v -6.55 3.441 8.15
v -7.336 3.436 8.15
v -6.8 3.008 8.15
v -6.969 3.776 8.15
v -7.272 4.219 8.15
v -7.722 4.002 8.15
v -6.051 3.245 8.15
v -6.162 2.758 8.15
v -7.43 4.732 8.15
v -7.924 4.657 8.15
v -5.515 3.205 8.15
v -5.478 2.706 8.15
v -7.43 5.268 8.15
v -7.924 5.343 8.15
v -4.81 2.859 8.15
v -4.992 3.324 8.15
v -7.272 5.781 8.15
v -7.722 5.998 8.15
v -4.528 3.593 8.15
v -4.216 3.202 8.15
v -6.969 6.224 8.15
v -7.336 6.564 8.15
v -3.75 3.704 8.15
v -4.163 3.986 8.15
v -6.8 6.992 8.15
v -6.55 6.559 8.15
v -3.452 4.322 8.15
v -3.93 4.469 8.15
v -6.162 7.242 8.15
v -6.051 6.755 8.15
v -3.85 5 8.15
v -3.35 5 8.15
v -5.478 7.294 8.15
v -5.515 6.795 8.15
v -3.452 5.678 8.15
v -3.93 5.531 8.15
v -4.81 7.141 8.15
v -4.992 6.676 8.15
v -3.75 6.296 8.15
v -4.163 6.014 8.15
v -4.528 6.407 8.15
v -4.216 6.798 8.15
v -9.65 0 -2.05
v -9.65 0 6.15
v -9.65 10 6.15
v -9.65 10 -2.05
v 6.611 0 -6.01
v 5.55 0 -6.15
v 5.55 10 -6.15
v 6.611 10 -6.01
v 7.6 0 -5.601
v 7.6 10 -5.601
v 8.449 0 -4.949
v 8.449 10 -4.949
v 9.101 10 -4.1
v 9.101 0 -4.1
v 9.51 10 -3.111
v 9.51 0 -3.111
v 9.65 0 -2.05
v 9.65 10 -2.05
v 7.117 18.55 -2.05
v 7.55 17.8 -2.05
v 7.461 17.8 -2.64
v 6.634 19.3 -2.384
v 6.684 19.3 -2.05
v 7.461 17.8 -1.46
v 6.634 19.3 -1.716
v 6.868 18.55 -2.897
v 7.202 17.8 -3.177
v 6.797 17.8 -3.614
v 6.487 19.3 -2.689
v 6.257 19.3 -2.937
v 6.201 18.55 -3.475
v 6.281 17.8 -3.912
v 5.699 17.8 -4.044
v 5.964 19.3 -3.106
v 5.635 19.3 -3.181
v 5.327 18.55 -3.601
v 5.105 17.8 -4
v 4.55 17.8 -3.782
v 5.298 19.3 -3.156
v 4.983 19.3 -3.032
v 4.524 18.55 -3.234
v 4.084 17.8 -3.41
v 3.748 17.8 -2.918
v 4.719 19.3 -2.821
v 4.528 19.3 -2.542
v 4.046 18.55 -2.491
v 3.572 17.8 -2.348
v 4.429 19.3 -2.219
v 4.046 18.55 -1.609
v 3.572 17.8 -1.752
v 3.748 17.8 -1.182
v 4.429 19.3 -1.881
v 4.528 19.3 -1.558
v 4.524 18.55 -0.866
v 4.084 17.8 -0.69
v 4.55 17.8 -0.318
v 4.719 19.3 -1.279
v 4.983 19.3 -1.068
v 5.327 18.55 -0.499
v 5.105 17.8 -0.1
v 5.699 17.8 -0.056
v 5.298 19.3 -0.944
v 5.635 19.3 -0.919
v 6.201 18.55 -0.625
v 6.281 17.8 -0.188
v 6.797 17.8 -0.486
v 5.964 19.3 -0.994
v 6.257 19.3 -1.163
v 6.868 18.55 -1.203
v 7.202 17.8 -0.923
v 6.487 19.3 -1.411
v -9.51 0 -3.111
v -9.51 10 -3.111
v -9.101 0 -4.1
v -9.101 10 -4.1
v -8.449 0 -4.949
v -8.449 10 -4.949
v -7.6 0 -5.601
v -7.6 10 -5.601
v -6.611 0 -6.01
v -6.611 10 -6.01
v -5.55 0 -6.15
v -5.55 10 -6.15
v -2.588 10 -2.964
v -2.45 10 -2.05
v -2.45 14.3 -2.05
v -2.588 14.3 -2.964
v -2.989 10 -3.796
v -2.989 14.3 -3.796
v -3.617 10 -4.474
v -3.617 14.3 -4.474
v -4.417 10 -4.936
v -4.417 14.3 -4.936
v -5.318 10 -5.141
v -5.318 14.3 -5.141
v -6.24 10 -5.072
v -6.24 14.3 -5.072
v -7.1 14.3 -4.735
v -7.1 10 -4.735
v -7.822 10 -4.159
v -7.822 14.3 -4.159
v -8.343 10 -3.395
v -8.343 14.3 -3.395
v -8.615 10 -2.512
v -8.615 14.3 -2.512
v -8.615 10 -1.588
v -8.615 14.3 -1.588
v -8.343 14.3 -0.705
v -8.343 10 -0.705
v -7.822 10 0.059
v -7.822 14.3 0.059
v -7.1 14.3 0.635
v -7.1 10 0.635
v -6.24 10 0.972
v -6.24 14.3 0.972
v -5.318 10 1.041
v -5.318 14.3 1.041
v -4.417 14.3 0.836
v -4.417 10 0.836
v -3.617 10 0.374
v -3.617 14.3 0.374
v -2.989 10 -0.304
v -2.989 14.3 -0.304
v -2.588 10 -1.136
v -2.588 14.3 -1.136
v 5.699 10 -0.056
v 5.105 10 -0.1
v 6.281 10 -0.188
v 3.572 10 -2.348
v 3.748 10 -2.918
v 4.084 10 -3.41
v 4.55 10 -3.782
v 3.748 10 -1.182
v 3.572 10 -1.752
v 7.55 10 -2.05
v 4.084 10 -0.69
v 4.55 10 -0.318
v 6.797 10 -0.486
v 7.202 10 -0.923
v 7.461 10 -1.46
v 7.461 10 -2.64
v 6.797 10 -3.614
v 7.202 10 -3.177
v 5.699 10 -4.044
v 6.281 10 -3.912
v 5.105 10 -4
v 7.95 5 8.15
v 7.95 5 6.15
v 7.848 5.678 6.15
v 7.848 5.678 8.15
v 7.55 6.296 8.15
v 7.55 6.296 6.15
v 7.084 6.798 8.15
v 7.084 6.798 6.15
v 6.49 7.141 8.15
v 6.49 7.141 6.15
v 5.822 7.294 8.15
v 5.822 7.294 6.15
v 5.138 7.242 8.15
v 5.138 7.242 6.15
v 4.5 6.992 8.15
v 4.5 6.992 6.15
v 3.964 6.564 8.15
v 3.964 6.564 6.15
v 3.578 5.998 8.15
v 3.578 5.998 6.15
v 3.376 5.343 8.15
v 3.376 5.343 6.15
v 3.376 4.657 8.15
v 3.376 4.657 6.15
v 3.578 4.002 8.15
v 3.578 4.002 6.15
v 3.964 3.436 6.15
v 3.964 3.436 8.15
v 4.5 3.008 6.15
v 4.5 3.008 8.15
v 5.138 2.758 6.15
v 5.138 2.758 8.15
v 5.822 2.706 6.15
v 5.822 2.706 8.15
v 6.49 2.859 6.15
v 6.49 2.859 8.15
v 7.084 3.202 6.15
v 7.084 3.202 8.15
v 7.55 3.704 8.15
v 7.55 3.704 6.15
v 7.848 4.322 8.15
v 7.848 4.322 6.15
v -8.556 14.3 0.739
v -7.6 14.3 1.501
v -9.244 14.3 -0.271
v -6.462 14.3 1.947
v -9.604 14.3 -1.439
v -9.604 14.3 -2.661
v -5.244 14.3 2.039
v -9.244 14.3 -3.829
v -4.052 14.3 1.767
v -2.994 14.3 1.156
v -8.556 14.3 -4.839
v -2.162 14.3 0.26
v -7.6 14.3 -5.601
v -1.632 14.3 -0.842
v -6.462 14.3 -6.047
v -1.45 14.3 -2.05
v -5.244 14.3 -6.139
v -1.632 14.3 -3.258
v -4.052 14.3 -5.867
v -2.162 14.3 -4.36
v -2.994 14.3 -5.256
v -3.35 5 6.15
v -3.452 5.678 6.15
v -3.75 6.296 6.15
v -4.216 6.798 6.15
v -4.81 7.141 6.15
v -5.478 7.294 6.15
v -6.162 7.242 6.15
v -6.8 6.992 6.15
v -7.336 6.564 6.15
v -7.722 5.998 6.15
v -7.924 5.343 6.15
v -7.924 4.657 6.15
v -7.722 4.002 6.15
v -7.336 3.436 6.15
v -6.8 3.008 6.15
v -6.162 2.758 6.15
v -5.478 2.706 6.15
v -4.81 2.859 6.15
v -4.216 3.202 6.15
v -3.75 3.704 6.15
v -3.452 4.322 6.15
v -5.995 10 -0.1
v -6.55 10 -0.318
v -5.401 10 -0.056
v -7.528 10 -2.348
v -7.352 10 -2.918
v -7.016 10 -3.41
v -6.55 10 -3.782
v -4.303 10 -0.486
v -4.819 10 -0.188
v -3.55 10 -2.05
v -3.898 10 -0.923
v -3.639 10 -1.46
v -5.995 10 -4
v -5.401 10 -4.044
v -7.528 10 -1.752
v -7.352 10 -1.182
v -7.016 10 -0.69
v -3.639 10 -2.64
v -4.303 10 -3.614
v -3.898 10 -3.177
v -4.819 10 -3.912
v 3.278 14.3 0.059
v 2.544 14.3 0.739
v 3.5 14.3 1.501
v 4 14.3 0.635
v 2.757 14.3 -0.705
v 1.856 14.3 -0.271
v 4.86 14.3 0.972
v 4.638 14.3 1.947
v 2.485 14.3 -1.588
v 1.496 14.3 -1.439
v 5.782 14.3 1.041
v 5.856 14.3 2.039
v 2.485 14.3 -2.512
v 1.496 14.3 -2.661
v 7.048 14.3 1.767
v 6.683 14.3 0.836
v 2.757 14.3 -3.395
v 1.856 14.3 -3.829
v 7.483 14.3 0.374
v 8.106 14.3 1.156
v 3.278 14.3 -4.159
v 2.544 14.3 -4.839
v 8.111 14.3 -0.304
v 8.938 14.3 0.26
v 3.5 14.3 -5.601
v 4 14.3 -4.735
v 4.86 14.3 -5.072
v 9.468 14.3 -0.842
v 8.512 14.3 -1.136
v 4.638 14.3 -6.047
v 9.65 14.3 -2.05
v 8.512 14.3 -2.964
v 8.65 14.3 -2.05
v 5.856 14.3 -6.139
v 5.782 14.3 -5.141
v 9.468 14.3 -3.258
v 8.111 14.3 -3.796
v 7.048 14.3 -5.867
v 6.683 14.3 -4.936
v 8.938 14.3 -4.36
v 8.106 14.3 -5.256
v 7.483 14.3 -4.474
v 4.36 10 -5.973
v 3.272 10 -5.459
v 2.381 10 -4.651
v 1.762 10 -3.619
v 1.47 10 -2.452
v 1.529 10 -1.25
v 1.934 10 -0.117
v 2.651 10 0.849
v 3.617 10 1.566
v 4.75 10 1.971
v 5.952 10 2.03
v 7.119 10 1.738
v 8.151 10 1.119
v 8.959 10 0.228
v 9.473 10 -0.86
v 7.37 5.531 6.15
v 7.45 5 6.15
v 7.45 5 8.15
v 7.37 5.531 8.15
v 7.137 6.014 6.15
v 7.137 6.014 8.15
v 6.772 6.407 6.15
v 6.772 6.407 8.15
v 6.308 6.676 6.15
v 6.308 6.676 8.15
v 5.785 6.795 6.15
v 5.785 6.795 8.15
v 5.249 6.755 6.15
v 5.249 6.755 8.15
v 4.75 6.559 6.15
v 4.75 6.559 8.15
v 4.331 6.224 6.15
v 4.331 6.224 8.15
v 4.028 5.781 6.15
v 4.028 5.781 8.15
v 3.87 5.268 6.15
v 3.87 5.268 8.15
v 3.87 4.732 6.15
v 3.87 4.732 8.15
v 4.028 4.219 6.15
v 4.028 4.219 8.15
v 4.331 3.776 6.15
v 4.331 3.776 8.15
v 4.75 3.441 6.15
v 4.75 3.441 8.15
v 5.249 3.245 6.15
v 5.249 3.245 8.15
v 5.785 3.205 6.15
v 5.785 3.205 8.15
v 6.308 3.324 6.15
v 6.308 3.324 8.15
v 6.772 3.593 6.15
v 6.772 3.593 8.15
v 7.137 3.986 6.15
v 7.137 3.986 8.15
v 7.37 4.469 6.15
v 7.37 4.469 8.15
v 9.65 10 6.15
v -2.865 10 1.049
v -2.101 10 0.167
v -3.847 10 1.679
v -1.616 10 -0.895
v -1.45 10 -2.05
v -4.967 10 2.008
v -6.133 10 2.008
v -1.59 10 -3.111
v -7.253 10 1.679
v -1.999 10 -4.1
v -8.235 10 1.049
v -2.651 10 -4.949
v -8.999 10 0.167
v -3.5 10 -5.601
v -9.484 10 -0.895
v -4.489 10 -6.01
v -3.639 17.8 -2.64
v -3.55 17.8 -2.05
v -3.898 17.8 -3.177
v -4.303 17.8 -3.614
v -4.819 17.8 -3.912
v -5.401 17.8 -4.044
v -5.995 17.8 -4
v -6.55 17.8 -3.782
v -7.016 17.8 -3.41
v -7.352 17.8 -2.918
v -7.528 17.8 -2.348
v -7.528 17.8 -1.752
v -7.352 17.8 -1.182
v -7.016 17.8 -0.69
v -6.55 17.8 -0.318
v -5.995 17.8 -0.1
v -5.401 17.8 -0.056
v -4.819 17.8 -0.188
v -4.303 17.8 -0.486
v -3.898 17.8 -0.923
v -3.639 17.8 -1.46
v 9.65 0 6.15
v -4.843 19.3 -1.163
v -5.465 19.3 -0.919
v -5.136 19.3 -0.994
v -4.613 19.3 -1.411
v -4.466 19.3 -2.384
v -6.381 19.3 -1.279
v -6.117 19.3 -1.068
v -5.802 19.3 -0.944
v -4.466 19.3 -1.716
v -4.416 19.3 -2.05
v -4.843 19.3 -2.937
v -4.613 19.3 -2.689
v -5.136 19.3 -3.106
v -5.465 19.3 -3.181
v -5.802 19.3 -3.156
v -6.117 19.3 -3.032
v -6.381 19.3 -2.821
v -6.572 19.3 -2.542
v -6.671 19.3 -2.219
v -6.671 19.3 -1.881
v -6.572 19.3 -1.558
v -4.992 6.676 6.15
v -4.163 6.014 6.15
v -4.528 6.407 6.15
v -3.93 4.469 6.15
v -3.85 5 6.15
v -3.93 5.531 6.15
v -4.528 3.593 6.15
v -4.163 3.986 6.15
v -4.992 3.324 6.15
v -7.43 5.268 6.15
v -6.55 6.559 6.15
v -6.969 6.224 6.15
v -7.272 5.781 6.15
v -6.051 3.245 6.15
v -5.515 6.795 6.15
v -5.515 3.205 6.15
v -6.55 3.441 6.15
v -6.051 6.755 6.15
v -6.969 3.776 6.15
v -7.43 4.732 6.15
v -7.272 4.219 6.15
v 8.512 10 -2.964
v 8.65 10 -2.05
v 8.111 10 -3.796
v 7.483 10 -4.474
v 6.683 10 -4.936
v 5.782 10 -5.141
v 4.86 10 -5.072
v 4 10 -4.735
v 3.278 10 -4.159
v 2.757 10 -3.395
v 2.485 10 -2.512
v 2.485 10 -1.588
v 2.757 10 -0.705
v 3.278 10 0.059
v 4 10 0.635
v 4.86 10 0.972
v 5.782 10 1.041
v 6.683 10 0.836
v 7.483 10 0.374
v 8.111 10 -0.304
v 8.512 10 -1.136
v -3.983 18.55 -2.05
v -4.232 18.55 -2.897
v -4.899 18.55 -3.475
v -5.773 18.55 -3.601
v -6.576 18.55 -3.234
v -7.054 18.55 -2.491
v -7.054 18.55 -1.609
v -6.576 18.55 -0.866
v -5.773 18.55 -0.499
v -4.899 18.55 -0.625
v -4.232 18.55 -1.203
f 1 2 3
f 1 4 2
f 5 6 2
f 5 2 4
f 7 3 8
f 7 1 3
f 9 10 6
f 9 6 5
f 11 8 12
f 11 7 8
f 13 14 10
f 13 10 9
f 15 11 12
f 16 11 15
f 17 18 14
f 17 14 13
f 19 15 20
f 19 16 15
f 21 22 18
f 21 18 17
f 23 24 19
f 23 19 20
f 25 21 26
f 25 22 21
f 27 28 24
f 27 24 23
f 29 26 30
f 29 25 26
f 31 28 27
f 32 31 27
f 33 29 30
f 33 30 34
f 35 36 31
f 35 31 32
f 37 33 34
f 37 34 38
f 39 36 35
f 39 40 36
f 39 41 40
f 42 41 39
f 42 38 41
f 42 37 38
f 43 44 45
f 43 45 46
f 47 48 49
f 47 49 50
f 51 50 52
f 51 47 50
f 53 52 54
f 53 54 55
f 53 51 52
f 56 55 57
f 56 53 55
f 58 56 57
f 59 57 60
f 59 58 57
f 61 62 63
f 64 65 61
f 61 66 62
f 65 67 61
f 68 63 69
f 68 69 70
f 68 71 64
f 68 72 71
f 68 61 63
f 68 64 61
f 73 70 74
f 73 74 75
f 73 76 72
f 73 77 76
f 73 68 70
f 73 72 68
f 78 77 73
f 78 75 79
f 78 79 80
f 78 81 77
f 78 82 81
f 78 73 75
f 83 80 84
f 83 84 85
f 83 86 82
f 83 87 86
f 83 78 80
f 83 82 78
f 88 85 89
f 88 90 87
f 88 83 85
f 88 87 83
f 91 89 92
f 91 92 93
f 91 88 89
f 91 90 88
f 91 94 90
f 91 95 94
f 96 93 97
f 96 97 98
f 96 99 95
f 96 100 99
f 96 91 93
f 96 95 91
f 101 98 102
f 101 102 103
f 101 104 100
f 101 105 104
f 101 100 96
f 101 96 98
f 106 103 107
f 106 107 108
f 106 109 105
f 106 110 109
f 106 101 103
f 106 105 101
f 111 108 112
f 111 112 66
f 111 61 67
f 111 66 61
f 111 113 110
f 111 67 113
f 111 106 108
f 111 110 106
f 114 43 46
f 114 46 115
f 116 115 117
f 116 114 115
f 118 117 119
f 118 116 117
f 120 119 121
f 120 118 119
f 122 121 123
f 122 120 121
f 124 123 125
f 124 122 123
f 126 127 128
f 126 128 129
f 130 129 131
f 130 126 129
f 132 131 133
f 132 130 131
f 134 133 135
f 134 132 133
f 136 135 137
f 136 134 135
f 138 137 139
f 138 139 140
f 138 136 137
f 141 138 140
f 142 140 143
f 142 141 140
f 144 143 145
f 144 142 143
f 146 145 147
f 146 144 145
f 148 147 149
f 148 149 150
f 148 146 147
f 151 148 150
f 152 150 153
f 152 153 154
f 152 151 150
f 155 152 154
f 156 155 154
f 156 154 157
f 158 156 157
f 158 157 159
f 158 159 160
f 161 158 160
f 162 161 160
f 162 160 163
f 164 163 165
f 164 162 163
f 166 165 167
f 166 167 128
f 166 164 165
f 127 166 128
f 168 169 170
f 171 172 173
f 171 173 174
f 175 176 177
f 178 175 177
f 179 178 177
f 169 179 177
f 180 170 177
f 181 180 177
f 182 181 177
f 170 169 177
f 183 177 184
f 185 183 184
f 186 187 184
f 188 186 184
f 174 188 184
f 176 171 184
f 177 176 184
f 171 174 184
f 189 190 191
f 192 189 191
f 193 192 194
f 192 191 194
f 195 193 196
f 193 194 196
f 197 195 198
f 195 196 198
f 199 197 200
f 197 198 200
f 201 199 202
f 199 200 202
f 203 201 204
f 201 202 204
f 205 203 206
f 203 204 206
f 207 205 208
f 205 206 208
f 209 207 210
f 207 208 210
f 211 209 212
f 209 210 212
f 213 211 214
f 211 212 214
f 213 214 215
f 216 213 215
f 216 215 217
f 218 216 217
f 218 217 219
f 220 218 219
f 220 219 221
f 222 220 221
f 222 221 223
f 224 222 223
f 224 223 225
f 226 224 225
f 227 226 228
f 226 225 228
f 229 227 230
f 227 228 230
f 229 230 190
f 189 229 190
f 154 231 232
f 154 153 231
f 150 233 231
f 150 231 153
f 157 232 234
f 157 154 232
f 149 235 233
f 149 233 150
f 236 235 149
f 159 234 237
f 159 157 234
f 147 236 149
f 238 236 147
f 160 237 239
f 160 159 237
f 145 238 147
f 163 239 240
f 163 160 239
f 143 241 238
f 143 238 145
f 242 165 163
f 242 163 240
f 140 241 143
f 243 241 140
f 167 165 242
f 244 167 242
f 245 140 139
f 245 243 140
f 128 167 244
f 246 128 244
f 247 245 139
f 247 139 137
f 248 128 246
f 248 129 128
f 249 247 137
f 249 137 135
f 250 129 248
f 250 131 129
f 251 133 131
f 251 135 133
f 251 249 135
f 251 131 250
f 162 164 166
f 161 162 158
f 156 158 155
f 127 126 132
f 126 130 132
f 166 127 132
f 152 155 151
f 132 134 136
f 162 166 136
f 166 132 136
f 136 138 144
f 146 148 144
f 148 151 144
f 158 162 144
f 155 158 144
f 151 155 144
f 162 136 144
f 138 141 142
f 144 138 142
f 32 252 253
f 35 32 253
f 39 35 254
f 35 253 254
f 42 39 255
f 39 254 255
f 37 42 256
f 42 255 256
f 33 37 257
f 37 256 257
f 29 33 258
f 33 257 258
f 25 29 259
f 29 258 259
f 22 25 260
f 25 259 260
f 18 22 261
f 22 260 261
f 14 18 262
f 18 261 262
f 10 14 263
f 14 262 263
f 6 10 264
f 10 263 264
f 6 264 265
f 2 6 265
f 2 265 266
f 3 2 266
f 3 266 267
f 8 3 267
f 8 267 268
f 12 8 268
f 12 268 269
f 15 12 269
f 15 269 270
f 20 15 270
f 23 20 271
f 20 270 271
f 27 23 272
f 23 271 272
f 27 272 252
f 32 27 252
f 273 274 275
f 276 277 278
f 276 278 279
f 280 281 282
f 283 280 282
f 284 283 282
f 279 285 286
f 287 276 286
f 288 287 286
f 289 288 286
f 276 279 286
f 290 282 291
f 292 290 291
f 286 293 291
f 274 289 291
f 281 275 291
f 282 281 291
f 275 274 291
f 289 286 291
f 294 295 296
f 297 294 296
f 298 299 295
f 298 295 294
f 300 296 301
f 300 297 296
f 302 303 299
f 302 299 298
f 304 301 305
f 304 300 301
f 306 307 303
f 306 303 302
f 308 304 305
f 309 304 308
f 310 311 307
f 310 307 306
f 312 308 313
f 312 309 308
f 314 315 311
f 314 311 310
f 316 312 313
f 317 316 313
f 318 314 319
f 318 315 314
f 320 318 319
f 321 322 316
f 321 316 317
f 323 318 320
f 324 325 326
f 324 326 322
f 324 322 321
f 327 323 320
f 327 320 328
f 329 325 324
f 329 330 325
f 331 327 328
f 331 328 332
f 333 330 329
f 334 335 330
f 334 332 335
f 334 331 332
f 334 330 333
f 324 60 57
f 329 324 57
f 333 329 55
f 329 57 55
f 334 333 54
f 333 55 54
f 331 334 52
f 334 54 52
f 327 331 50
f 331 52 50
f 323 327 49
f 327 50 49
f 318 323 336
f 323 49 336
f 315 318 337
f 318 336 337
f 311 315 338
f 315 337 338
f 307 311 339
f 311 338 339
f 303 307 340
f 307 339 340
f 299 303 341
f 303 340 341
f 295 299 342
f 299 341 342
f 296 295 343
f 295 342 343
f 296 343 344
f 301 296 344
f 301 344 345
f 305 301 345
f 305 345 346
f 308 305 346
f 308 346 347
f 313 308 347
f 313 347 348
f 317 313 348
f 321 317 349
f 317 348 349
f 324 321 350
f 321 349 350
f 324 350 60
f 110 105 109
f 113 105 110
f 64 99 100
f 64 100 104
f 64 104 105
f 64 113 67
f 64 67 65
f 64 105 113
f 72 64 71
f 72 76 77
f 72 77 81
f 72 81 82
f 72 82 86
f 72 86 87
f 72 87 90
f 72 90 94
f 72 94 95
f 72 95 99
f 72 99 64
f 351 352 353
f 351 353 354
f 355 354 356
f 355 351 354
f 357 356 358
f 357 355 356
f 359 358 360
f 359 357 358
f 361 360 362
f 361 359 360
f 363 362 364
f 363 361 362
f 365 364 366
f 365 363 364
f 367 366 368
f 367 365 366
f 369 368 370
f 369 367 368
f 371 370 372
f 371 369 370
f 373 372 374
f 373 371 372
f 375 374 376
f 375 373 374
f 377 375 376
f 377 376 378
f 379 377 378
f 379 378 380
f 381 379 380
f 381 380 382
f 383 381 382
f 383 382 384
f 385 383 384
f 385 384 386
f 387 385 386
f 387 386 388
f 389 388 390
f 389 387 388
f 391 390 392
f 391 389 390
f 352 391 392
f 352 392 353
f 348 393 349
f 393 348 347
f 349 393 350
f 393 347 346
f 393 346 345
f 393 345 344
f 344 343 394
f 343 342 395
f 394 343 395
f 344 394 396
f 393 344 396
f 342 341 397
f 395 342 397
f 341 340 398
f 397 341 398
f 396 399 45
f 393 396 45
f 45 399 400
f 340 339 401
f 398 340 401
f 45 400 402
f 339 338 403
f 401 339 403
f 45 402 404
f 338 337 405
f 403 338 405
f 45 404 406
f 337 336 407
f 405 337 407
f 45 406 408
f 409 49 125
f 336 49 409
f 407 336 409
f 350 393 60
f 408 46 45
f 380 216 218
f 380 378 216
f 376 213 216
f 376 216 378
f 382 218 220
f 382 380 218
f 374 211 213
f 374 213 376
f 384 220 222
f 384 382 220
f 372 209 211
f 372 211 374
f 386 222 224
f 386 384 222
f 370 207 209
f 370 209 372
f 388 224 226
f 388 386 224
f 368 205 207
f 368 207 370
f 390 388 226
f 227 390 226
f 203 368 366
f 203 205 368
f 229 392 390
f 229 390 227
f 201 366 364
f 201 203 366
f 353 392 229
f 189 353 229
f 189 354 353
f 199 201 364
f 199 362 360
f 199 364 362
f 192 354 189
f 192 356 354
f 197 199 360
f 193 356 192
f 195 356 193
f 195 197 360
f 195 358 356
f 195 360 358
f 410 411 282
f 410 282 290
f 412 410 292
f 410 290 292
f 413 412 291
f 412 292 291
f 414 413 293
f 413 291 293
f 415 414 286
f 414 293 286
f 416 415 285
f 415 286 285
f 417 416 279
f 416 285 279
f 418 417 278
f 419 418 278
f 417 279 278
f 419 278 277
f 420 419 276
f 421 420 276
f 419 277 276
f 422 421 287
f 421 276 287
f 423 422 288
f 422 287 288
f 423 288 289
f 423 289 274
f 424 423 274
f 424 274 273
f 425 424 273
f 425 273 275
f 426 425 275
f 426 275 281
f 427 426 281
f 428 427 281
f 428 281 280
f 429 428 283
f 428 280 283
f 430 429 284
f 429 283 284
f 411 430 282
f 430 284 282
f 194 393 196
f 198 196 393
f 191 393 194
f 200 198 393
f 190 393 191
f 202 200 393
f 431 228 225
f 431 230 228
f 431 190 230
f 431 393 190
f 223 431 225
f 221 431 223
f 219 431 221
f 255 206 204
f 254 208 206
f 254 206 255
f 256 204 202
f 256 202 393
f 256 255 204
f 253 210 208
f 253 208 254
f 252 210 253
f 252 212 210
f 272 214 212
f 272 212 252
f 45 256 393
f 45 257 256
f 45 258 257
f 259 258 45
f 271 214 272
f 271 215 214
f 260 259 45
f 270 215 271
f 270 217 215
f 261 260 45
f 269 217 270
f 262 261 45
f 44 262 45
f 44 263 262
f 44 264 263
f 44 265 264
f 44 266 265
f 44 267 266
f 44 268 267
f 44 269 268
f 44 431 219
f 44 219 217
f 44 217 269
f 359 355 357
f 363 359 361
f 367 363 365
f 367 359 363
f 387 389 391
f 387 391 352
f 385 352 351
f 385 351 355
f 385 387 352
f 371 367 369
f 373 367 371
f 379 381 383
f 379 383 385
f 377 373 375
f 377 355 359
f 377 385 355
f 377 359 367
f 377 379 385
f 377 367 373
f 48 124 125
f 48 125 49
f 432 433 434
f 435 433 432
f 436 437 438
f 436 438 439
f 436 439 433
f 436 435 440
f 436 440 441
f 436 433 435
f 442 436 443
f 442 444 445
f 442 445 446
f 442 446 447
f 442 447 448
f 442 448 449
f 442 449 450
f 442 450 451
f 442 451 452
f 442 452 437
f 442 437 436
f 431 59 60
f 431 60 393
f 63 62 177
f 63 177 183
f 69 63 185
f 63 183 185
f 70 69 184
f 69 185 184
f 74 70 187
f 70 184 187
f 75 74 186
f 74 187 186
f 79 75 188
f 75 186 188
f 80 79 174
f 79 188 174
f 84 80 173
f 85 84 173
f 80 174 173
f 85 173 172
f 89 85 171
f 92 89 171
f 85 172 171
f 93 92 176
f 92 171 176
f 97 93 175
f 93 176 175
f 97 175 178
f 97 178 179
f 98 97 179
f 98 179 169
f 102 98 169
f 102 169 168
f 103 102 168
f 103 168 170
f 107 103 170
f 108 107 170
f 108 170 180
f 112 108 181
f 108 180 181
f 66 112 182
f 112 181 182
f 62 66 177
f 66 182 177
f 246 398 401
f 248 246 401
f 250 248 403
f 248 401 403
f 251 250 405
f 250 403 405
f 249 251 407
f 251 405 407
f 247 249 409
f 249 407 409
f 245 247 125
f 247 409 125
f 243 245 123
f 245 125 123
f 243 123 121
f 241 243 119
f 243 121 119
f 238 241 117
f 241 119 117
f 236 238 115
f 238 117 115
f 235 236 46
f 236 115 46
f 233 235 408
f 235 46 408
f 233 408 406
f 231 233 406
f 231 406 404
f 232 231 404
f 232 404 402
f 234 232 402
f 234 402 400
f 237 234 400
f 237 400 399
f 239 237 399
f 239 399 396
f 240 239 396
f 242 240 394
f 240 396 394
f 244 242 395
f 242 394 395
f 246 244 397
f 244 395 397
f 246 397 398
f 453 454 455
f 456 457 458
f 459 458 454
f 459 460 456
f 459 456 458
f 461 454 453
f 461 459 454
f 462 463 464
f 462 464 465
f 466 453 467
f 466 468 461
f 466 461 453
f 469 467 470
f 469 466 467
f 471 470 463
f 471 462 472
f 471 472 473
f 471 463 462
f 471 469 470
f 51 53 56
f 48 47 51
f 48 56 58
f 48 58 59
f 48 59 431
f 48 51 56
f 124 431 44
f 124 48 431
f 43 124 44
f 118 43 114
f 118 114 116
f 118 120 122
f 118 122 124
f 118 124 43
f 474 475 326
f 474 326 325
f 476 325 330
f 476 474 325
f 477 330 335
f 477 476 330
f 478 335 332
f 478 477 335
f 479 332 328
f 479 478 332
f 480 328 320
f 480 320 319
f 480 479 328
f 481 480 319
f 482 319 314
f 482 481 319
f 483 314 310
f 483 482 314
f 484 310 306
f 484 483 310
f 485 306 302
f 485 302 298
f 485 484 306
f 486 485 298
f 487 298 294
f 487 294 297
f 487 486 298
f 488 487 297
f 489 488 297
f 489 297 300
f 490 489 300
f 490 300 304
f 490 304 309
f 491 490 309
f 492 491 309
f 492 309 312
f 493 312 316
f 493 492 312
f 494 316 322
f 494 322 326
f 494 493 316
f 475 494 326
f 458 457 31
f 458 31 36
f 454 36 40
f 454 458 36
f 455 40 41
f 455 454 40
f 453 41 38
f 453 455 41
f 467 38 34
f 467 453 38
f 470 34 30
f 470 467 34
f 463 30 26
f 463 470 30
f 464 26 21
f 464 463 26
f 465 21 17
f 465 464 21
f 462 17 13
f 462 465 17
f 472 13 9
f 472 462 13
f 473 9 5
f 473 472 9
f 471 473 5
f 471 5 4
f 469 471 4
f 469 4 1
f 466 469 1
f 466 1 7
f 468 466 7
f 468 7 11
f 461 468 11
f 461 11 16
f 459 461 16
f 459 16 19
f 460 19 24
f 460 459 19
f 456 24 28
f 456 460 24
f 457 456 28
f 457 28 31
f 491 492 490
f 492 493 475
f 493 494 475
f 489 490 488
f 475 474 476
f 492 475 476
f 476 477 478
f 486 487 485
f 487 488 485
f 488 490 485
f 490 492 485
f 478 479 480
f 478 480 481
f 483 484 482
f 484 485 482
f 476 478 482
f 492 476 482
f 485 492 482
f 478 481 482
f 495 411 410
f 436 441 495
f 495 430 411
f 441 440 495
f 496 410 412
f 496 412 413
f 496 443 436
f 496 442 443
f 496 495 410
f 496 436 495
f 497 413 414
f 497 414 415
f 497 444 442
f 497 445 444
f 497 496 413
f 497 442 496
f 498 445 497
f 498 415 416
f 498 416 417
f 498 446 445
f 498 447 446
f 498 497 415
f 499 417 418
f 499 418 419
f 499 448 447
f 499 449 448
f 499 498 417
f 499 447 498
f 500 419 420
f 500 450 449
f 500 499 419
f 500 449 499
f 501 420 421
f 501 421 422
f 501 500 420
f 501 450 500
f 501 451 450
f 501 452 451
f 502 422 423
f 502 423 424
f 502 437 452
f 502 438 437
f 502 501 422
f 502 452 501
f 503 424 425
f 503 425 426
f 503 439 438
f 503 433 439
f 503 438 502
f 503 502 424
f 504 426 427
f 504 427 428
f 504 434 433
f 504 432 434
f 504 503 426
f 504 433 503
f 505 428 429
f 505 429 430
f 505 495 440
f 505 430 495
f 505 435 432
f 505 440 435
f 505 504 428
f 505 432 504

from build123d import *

# Parameters (mm, degrees)
BOSS_EXTRUDE1_DEPTH   = 10
SKETCH3_R             = 4.1
SKETCH3_R_2           = 3.1
BOSS_EXTRUDE2_DEPTH   = 4.3
SKETCH4_R             = 2
BOSS_EXTRUDE3_DEPTH   = 9.3
BOSS_EXTRUDE3_2_DEPTH = 9.3
CHAMFER1_SIZE         = 1.5
CHAMFER1_SIZE2        = 0.866025404
CHAMFER2_SIZE         = 1.5
CHAMFER2_SIZE2        = 0.866025404
SKETCH5_R             = 2.3
SKETCH5_R_2           = 1.8
BOSS_EXTRUDE4_DEPTH   = 2


with BuildPart() as part:
    # Sketch2 → Boss-Extrude1 (new body)
    with BuildSketch(Plane(origin=(0, 0, 0), x_dir=(1, 0, 0), z_dir=(0, 1, 0))):
        with BuildLine():
            Line((-5.55, 6.15), (5.55, 6.15))
            ThreePointArc((5.55, 6.15), (8.449137803, 4.949137803), (9.65, 2.05))
            Line((9.65, 2.05), (9.65, -6.15))
            Line((9.65, -6.15), (-9.65, -6.15))
            Line((-9.65, -6.15), (-9.65, 2.05))
            ThreePointArc((-9.65, 2.05), (-8.449137803, 4.949137803), (-5.55, 6.15))
        make_face()
    extrude(amount=BOSS_EXTRUDE1_DEPTH)

    # Sketch3 → Boss-Extrude2 (add)
    with BuildSketch(Plane(origin=(0, 10, 0), x_dir=(1, 0, 0), z_dir=(0, 1, 0))):
        with Locations((-5.55, 2.05)):
            Circle(SKETCH3_R)
        with Locations((-5.55, 2.05)):
            Circle(SKETCH3_R_2, mode=Mode.SUBTRACT)
        with Locations((5.55, 2.05)):
            Circle(SKETCH3_R)
        with Locations((5.55, 2.05)):
            Circle(SKETCH3_R_2, mode=Mode.SUBTRACT)
    extrude(amount=BOSS_EXTRUDE2_DEPTH)

    # Sketch5 → Boss-Extrude4 (add)
    with BuildSketch(Plane.XY.offset(6.15)):
        with Locations((-5.65, 5)):
            Circle(SKETCH5_R)
        with Locations((-5.65, 5)):
            Circle(SKETCH5_R_2, mode=Mode.SUBTRACT)
        with Locations((5.65, 5)):
            Circle(SKETCH5_R)
        with Locations((5.65, 5)):
            Circle(SKETCH5_R_2, mode=Mode.SUBTRACT)
    extrude(amount=BOSS_EXTRUDE4_DEPTH)


with BuildPart() as body_2:
    # Sketch4 → Boss-Extrude3 (new body)
    with BuildSketch(Plane(origin=(0, 10, 0), x_dir=(1, 0, 0), z_dir=(0, 1, 0))):
        with Locations((-5.55, 2.05)):
            Circle(SKETCH4_R)
    extrude(amount=BOSS_EXTRUDE3_DEPTH)

    # Chamfer1
    chamfer1_edges = [body_2.edges().sort_by_distance(p)[0] for p in [
        (-7.55, 19.3, -2.05),
    ]]
    chamfer1_side = [body_2.faces().sort_by_distance(p)[0] for p in [
        (-7.55, 14.65, -2.05),
    ]]
    chamfer(chamfer1_edges, length=CHAMFER1_SIZE, length2=CHAMFER1_SIZE2, reference=chamfer1_side[0])


with BuildPart() as body_3:
    # Sketch4 → Boss-Extrude3 2 (new body)
    with BuildSketch(Plane(origin=(0, 10, 0), x_dir=(1, 0, 0), z_dir=(0, 1, 0))):
        with Locations((5.55, 2.05)):
            Circle(SKETCH4_R)
    extrude(amount=BOSS_EXTRUDE3_2_DEPTH)

    # Chamfer2
    chamfer2_edges = [body_3.edges().sort_by_distance(p)[0] for p in [
        (3.55, 19.3, -2.05),
    ]]
    chamfer2_side = [body_3.faces().sort_by_distance(p)[0] for p in [
        (3.55, 14.65, -2.05),
    ]]
    chamfer(chamfer2_edges, length=CHAMFER2_SIZE, length2=CHAMFER2_SIZE2, reference=chamfer2_side[0])


solid = Compound([part.part, body_2.part, body_3.part])
